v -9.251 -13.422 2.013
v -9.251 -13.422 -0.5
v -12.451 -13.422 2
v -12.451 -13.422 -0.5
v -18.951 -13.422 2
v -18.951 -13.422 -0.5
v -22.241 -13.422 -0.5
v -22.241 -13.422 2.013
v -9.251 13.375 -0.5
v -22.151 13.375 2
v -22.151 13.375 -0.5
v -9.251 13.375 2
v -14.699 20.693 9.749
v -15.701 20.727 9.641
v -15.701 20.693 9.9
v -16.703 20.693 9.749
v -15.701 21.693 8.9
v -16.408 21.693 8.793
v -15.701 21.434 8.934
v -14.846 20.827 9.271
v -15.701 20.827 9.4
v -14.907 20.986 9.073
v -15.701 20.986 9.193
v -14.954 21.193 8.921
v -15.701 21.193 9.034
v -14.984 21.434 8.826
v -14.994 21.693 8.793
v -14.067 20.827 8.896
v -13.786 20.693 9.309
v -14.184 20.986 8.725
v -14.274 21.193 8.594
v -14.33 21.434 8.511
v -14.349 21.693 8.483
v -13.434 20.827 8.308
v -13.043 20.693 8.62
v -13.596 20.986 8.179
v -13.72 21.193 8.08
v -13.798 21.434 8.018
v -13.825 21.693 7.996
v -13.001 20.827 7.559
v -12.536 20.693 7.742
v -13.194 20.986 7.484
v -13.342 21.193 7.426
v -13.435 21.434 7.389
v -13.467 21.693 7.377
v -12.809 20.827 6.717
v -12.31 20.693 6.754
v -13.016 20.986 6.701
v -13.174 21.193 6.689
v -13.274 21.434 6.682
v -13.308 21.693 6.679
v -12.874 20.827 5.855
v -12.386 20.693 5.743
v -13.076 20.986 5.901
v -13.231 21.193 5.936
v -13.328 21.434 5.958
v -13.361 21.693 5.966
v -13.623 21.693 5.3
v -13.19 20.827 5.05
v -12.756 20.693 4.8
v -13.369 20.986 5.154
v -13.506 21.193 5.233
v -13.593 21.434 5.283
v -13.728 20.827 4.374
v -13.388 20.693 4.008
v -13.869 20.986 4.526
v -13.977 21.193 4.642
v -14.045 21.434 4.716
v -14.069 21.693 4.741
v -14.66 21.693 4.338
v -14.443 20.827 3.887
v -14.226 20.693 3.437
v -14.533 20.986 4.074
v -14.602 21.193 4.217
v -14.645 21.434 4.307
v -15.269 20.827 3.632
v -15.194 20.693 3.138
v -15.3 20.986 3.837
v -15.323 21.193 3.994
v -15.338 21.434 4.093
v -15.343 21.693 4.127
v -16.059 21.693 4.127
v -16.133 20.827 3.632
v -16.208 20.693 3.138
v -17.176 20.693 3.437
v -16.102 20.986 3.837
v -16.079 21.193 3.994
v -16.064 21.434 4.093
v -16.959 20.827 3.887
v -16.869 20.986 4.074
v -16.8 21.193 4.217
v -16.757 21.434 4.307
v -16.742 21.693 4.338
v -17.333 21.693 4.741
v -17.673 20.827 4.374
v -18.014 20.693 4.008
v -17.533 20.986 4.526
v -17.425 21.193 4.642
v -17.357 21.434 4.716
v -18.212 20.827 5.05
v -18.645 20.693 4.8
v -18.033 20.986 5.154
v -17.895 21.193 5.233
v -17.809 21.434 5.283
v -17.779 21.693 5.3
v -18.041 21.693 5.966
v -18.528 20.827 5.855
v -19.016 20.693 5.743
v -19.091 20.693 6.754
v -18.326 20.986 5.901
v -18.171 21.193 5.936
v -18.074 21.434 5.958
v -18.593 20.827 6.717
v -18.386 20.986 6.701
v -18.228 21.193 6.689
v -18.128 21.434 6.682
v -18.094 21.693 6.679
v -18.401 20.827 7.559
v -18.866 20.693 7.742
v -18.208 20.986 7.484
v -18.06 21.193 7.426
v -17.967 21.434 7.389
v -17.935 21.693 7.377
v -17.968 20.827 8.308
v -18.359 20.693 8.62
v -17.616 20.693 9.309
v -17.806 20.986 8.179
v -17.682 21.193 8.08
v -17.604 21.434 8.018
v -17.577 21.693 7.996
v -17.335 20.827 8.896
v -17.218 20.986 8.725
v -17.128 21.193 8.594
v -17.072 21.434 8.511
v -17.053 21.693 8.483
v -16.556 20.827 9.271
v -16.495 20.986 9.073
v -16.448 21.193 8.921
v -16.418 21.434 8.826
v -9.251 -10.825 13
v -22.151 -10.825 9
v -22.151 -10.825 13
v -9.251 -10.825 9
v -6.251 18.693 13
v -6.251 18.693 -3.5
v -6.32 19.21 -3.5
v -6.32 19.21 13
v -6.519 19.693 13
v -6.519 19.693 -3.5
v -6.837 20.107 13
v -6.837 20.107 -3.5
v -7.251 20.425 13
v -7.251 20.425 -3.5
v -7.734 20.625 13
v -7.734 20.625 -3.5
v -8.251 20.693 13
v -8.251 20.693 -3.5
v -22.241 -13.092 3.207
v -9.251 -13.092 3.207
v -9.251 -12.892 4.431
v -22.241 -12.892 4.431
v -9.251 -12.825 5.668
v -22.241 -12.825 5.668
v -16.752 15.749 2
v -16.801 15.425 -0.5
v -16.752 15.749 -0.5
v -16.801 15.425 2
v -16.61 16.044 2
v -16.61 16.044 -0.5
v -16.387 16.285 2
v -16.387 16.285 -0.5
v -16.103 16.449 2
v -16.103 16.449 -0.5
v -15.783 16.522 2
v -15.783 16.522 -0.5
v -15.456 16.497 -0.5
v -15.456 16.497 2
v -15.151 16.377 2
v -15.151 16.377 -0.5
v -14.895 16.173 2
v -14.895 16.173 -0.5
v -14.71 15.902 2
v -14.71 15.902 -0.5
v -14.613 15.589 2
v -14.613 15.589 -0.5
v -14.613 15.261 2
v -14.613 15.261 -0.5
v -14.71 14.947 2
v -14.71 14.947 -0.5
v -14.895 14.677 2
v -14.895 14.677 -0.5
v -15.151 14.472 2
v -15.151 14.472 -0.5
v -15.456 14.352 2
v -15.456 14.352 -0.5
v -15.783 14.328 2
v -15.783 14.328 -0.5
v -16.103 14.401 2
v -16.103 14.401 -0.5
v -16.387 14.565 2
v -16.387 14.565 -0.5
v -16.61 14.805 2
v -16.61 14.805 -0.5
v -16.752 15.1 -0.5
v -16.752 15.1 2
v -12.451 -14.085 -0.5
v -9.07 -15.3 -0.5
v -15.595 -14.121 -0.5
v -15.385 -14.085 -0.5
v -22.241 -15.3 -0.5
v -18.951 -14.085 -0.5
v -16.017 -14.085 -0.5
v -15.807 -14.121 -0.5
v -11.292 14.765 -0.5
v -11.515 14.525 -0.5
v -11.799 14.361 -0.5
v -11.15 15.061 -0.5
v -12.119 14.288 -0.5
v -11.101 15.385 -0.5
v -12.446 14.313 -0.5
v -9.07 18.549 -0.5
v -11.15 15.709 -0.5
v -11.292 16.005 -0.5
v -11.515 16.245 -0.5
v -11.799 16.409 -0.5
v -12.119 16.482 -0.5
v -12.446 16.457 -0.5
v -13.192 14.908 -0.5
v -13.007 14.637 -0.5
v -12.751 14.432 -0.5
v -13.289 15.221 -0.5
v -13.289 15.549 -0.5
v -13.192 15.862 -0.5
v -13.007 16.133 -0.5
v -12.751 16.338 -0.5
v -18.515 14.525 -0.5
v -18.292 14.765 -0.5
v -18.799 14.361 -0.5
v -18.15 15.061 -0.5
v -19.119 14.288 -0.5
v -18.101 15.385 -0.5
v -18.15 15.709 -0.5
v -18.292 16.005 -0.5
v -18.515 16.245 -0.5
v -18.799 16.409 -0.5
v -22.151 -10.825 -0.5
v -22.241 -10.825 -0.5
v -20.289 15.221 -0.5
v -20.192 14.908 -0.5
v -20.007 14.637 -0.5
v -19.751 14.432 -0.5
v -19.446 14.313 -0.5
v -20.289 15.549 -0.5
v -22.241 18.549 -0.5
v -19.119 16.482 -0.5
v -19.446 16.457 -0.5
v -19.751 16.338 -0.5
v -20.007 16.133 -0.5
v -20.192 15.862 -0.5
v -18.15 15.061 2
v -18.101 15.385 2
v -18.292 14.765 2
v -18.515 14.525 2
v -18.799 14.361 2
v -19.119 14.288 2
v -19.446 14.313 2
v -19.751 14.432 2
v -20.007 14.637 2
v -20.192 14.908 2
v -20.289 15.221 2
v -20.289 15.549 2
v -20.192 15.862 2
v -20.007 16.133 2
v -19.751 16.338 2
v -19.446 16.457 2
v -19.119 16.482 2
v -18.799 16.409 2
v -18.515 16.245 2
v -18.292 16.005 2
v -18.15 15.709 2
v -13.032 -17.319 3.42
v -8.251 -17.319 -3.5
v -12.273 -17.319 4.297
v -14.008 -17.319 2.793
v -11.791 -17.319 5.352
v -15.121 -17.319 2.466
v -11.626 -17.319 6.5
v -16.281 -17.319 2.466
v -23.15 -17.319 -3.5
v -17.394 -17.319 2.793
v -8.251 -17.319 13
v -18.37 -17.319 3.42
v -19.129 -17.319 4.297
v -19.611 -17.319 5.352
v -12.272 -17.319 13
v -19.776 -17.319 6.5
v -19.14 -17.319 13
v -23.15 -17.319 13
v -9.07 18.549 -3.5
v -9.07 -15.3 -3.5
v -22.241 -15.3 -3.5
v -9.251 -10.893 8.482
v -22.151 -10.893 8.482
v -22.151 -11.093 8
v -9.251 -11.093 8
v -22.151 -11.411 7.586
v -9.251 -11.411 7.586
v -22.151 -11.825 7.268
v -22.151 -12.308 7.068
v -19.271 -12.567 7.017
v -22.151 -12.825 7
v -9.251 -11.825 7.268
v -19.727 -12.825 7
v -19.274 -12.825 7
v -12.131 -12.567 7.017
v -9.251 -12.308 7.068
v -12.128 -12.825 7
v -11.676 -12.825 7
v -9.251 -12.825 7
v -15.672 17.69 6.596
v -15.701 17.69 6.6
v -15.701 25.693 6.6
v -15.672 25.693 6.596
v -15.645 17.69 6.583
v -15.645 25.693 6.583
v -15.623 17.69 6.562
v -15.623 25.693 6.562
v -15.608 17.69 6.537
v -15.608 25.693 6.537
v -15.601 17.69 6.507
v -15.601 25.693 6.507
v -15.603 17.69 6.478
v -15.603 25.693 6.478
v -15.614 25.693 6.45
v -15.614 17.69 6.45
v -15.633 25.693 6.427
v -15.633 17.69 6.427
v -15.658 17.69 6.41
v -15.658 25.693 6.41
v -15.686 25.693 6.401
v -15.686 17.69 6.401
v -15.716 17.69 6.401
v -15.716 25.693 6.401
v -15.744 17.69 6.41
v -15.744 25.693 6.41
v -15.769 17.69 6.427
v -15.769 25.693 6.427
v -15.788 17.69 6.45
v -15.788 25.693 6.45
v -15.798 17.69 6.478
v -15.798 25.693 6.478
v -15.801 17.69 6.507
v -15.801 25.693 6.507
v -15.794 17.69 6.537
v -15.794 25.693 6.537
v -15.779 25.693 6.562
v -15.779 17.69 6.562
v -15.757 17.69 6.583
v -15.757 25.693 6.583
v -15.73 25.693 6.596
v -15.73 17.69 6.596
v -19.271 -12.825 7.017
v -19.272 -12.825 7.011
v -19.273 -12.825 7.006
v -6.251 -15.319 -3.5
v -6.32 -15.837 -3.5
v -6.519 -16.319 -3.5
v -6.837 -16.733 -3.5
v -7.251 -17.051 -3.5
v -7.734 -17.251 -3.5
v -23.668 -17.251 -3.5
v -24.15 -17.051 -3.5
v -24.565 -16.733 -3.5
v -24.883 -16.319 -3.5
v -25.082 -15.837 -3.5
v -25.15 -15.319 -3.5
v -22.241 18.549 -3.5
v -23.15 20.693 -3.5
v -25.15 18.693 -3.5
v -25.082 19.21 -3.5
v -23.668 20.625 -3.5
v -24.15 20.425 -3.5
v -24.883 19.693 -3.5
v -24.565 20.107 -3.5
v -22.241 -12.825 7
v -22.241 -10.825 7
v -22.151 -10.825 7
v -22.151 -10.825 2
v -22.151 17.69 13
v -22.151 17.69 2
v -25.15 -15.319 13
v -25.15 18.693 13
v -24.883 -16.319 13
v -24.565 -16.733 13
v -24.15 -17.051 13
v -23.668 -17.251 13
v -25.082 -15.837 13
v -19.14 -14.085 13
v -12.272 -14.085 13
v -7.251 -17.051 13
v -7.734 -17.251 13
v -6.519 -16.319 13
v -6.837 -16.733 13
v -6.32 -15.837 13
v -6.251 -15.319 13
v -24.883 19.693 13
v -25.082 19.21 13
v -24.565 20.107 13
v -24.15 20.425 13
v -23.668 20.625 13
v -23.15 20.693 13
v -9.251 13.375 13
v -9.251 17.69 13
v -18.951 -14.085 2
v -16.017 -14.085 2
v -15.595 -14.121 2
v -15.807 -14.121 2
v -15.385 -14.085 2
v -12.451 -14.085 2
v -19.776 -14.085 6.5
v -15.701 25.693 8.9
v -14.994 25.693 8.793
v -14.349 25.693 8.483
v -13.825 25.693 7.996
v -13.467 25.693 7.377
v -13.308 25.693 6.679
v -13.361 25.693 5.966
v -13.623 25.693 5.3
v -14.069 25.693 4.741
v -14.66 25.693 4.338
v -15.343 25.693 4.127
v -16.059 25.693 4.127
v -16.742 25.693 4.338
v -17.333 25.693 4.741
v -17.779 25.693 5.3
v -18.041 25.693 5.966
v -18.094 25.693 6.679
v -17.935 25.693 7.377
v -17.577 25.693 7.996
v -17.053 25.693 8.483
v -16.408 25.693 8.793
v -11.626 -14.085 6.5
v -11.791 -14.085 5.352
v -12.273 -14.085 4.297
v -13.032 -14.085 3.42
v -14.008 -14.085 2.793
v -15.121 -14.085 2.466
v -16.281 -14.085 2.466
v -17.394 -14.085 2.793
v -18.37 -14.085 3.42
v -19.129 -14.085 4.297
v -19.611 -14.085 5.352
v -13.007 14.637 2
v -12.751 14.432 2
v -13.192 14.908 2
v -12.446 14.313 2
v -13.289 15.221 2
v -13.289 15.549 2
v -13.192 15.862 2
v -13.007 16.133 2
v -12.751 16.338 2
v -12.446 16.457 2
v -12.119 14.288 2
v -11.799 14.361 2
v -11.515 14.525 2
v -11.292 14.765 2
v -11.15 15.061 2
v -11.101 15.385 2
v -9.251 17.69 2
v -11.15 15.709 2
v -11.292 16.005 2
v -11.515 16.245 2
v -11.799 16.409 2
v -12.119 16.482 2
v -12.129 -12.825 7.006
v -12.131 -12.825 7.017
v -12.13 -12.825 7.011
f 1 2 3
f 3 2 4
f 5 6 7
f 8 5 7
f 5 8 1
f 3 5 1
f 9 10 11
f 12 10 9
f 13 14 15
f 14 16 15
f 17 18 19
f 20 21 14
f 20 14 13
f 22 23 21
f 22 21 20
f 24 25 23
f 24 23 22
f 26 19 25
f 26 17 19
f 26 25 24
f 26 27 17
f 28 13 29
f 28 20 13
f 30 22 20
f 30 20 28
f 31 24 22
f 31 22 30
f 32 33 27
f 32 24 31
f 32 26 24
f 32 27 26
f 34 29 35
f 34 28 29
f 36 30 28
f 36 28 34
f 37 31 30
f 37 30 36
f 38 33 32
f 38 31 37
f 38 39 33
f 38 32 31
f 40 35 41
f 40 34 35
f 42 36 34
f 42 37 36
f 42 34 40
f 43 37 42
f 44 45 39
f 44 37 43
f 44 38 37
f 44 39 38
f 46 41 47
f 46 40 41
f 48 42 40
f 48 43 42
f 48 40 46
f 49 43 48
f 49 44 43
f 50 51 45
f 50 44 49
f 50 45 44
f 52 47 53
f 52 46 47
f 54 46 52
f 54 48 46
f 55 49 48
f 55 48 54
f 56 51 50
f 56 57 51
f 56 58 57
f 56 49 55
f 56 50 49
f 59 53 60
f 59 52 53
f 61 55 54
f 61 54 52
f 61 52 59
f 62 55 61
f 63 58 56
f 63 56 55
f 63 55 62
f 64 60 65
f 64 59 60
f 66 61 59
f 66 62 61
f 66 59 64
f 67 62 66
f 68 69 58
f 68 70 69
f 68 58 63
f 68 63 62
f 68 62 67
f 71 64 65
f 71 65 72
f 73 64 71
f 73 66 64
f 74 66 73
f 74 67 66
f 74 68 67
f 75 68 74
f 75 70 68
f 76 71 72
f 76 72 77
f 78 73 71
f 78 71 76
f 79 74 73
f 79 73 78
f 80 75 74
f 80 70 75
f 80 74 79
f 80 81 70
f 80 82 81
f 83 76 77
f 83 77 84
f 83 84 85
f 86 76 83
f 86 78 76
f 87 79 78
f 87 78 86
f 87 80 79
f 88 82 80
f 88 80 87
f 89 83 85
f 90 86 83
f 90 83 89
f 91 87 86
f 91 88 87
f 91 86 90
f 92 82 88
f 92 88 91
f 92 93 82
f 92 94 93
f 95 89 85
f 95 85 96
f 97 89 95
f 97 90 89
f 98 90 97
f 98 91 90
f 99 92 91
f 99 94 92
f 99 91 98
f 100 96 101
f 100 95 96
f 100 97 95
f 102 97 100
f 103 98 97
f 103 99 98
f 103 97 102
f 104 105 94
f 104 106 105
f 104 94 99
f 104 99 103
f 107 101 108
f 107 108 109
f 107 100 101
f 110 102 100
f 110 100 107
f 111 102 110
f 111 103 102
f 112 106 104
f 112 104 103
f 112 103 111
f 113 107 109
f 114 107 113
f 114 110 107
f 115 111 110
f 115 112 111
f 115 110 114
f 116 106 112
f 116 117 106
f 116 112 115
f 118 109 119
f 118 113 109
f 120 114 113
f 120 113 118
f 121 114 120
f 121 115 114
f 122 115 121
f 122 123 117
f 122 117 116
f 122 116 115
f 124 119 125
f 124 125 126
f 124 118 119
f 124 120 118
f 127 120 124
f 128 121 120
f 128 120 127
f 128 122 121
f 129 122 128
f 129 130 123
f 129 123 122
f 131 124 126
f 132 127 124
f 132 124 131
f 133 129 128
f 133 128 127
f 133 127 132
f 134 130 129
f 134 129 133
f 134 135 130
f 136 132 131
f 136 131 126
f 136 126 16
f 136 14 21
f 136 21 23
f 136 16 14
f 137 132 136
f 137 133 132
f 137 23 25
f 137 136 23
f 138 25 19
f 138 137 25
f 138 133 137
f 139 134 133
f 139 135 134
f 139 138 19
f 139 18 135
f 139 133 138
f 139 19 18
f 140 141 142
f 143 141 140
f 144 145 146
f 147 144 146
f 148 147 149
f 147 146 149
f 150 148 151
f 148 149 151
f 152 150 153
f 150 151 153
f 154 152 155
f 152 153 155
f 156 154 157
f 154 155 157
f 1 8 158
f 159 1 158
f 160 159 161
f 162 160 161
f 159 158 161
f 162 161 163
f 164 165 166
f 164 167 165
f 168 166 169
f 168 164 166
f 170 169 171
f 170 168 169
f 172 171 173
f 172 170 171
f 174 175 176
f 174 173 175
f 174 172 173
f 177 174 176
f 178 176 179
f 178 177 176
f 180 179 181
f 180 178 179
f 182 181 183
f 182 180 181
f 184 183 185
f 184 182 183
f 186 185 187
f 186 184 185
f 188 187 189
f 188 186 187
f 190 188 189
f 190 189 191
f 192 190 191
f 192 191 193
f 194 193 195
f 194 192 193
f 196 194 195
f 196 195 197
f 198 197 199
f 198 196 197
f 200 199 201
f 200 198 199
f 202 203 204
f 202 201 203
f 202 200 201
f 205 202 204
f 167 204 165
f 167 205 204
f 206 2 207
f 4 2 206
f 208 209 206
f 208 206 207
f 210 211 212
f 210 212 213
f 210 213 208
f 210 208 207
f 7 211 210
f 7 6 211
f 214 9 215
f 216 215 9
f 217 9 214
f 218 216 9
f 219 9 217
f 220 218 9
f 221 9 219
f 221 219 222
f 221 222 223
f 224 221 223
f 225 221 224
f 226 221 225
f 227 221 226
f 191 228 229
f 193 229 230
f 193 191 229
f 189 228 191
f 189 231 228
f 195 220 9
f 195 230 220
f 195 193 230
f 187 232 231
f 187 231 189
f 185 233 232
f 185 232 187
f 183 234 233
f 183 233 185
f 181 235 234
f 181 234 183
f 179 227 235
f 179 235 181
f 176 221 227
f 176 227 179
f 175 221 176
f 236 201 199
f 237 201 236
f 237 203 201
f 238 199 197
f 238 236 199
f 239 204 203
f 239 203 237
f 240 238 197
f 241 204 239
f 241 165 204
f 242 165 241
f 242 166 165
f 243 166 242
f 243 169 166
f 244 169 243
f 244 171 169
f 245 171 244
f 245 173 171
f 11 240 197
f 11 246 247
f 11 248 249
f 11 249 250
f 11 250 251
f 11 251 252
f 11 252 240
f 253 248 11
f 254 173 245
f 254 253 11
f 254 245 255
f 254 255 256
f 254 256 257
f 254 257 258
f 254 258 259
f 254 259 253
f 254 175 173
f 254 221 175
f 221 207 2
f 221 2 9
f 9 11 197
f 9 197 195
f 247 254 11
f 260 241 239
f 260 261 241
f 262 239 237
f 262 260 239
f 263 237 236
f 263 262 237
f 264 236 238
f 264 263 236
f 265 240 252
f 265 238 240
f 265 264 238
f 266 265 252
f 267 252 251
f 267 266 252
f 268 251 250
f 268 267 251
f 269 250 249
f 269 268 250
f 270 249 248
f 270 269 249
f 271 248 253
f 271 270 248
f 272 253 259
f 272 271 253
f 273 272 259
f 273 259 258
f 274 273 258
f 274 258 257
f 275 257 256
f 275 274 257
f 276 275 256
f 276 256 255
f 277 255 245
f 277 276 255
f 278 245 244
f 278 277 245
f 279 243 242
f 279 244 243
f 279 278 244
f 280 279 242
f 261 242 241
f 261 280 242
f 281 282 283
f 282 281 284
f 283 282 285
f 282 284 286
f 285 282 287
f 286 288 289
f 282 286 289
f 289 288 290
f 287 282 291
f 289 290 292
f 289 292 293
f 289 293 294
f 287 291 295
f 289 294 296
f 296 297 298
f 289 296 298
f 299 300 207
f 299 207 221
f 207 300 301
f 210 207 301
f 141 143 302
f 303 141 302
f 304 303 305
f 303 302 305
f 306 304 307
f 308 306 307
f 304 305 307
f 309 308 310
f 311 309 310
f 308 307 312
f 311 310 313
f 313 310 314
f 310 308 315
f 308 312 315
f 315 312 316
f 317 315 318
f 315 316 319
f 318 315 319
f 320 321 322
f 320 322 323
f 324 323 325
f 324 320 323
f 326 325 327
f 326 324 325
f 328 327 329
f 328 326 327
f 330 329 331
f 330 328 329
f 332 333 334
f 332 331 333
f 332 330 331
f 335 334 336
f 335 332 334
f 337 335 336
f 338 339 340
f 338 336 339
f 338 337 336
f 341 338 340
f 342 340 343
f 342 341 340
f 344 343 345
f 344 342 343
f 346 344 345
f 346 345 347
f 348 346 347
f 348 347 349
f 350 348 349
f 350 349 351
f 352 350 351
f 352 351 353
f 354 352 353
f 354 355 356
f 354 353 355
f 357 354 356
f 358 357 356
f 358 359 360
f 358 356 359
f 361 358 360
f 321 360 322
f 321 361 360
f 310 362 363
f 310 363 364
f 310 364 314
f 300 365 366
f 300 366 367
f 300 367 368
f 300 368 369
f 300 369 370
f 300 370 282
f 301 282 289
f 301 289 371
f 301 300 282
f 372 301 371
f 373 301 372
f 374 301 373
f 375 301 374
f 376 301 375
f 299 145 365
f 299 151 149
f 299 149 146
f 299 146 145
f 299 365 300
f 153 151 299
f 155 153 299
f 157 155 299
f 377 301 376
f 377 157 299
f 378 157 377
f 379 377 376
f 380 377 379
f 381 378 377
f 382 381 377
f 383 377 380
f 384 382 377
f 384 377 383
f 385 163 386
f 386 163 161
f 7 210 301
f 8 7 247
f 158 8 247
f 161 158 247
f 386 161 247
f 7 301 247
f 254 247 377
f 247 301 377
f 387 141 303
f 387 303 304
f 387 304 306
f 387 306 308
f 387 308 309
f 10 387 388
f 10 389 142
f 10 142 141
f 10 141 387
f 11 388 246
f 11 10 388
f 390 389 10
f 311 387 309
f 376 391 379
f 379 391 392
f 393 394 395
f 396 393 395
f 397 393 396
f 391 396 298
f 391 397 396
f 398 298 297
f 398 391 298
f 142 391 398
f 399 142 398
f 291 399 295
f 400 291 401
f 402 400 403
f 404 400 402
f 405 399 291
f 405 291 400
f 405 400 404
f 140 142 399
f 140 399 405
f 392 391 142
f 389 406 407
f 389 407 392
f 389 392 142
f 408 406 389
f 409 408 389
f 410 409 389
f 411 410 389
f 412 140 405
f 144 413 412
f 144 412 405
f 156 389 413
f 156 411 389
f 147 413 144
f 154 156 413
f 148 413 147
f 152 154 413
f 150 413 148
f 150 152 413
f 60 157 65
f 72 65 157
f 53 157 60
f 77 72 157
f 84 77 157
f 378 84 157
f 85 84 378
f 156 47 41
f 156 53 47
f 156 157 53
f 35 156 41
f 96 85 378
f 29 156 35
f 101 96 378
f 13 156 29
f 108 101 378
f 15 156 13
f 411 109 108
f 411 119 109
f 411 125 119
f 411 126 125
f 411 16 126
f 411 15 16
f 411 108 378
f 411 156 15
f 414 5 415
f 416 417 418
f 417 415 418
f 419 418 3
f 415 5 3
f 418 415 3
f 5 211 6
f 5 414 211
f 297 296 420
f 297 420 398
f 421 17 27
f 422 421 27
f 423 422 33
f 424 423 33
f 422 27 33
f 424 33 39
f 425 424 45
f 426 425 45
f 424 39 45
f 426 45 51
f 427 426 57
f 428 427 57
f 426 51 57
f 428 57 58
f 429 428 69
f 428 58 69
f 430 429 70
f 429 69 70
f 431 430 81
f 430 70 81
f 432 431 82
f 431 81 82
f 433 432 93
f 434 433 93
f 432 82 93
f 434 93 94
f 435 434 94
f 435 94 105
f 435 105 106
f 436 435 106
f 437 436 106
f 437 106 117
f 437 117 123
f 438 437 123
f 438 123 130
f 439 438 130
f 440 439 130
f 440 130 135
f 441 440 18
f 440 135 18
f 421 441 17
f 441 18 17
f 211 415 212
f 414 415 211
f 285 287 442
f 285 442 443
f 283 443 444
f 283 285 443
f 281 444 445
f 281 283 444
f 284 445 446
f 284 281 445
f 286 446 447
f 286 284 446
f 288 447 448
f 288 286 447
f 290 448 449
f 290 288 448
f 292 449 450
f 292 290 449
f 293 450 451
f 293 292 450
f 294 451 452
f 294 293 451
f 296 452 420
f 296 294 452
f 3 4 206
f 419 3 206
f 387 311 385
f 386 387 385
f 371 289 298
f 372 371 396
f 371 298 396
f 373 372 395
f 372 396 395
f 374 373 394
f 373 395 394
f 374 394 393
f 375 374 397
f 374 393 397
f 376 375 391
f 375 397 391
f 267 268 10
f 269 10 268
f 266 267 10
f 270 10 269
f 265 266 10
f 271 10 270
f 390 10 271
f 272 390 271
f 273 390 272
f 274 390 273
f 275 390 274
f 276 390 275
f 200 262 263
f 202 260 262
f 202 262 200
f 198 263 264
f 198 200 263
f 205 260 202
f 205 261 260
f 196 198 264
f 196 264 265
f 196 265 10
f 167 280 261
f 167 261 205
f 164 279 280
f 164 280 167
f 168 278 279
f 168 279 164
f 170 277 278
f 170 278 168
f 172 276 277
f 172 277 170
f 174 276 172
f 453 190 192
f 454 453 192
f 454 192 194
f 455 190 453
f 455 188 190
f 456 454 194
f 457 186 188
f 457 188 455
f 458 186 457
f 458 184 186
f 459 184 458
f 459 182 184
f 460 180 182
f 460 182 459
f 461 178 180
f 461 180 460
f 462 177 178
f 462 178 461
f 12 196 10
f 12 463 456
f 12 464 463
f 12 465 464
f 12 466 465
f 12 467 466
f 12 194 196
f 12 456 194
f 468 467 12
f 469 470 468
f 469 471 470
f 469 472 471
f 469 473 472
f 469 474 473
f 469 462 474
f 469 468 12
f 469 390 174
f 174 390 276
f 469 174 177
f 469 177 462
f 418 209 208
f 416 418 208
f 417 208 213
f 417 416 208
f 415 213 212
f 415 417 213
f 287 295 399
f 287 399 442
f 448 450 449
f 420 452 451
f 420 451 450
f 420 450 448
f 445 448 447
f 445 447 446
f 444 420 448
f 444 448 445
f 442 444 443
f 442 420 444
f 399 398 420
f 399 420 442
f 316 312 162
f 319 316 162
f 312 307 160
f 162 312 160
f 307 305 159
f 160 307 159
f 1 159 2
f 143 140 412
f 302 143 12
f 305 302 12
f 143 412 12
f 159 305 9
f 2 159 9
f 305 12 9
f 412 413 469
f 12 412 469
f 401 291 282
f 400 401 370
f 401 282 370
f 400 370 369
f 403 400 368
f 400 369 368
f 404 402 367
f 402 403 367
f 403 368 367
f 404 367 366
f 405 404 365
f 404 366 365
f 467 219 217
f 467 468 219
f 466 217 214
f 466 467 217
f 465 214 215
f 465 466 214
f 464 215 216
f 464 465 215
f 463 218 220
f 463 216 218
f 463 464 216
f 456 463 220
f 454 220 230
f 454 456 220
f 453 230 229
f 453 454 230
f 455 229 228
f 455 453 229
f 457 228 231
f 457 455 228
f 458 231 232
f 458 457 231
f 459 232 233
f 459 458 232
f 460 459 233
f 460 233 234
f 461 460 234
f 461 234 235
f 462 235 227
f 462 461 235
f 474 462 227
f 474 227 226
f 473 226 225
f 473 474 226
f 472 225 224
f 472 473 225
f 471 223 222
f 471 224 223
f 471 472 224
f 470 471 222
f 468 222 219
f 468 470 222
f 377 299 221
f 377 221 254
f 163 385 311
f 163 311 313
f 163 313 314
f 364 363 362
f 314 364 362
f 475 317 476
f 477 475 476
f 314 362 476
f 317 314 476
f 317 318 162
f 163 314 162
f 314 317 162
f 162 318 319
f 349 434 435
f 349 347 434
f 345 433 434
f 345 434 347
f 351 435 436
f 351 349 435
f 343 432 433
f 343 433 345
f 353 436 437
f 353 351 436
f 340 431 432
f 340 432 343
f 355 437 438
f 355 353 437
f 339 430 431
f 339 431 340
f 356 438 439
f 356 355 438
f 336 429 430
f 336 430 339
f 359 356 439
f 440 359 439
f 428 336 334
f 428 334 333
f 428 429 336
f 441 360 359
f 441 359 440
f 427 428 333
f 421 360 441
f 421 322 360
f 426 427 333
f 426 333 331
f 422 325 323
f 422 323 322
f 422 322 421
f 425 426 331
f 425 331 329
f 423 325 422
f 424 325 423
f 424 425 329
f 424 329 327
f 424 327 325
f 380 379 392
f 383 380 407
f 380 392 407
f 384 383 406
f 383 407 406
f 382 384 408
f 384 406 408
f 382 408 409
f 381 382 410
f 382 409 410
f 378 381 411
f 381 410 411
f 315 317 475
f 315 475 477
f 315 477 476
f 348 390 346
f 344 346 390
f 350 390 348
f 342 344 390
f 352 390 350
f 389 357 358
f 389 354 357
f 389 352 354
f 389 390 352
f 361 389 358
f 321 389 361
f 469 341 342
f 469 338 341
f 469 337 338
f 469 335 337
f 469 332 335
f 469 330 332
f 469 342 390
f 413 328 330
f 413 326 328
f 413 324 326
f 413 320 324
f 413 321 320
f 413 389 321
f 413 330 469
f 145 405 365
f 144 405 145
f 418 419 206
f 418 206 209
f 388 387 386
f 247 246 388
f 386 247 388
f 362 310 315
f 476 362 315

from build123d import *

# Parameters (mm, degrees)
SKETCH_1_W                = 32.6
SKETCH_1_H                = 34.6
SKETCH_1_R                = 1.1
SKETCH_1_R_2              = 1.25
SKETCH_1_W_2              = 24.6
SKETCH_1_H_2              = 24.2
EXTRUDE_1_DEPTH           = 13
SKETCH_3_W                = 6.5
SKETCH_3_H                = 6.519005167
CUT_EXTRUDE_1_DEPTH       = 19
SKETCH_4_W                = 6.5
SKETCH_4_H                = 6.467668889
CUT_EXTRUDE_2_DEPTH       = 23
EXTRUDE_2_DEPTH           = 50
SKETCH_1_2_W              = 22.27659965
SKETCH_1_2_H              = 4.598586669
SKETCH_1_2_W_2            = 22.283050596
SKETCH_1_2_H_2            = 4.977540741
CUT_EXTRUDE_5_DEPTH       = 34
FILLET_1_R                = 2
FILLET_2_R                = 2
SKETCH_9_W                = 54.594998093
SKETCH_9_H                = 18.111982385
SKETCH_9_W_2              = 52.534809486
SKETCH_9_H_2              = 12.989301534
CUT_EXTRUDE_6_DEPTH       = 41
FILLET_6_R                = 22
EXTRUDE_4_DEPTH           = 13
SKETCH_13_W               = 5.518907879
SKETCH_13_H               = 8.361822047
CUT_EXTRUDE_8_DEPTH       = 8.5
SKETCH_14_W               = 6.038657432
SKETCH_14_H               = 7.741248121
CUT_EXTRUDE_9_DEPTH       = 8.5
SKETCH_23_OUTSIDE_W       = 35.102
SKETCH_23_OUTSIDE_H       = 56.702
SKETCH_23_OUTSIDE_W_2     = 1.5
SKETCH_23_OUTSIDE_H_2     = 34.6
CUT_EXTRUDE_10_DEPTH      = 104
SKETCH_24_W               = 10.341780897
SKETCH_24_H               = 5.2
SKETCH_24_R               = 1.25
EXTRUDE_5_DEPTH           = 1.5
SKETCH_25_R               = 1.25
CUT_EXTRUDE_11_DEPTH      = 104
SKETCH_26_OUTSIDE_W       = 115.402
SKETCH_26_OUTSIDE_H       = 56.536
SKETCH_26_OUTSIDE_W_2     = 17.268409177
SKETCH_26_OUTSIDE_H_2     = 34.6
CUT_EXTRUDE_12_DEPTH      = 10
SKETCH_27_W               = 2.368409177
SKETCH_27_H               = 25.781356428
EXTRUDE_6_DEPTH           = 1.5
SKETCH_28_R               = 1.1
CUT_EXTRUDE_13_DEPTH      = 10
CUT_EXTRUDE_START         = -2
CUT_EXTRUDE_14_OUTLINE_W  = 0.368409177
CUT_EXTRUDE_14_OUTLINE_H  = 34.6
CUT_EXTRUDE_14_DEPTH      = 3
SKETCH_30_W               = 15.411127821
SKETCH_30_H               = 34.6
EXTRUDE_7_DEPTH           = 1.5
SKETCH_33_W               = 23.9
SKETCH_33_H               = 38.011921137
SKETCH_33_R               = 1.1
EXTRUDE_8_DEPTH           = 15
SKETCH_34_OUTSIDE_W       = 35.468
SKETCH_34_OUTSIDE_H       = 49.58
SKETCH_34_OUTSIDE_W_2     = 18.899009792
SKETCH_34_OUTSIDE_H_2     = 43.211027868
CUT_EXTRUDE_15_DEPTH      = 13.5
SKETCH_35_W               = 12.9
SKETCH_35_H               = 31.784162084
CUT_EXTRUDE_16_DEPTH      = 11
SKETCH_37_R               = 2.4
EXTRUDE_9_DEPTH           = 5
SKETCH_39_W               = 13.171271292
SKETCH_39_H               = 33.849019387
CUT_EXTRUDE_17_DEPTH      = 3
FILLET_7_R                = 3
CUT_EXTRUDE_18_DEPTH      = 53.759852886
CUT_EXTRUDE_18_DEPTH_BACK = 53.759852886
SKETCH_40_R               = 0.1
SKETCH_42_W               = 13.648654979
SKETCH_42_H               = 4.665334349
EXTRUDE_10_DEPTH          = 11
CUT_EXTRUDE_19_DEPTH      = 4.493948053
SKETCH_43_R               = 3.607554058
CUT_EXTRUDE_20_DEPTH      = 1
SKETCH_44_W               = 12.990377478
SKETCH_44_H               = 2.596310078
CUT_EXTRUDE_21_DEPTH      = 7.5
SKETCH_46_W               = 13.018615597
SKETCH_46_H               = 10.987054625
EXTRUDE_11_DEPTH          = 1.259502583
SKETCH_48_W               = 7.320827495
SKETCH_48_H               = 3.139430645
EXTRUDE_12_DEPTH          = 1
FILLET_9_R                = 11.5
FILLET_11_R               = 2
CUT_EXTRUDE_23_DEPTH      = 41.086666278
CUT_EXTRUDE_23_DEPTH_BACK = 41.086666278
SKETCH_50_W               = 13.704348931
SKETCH_50_H               = 44.342522193
SKETCH_50_W_2             = 6.251475496
FILLET_12_R               = 2
FILLET_13_R               = 1


with BuildPart() as part:
    # Sketch 1 → 凸台-拉伸1 (new body)
    with BuildSketch(Plane.XY):
        with Locations((-9.850980392, 1.274712581)):
            Rectangle(SKETCH_1_W, SKETCH_1_H)
        with Locations(Location((-15.700980392, 15.424712581, 0), (0, 0, 180))):
            Circle(SKETCH_1_R, mode=Mode.SUBTRACT)
        with Locations(Location((-3.600980392, 15.424712581, 0), (0, 0, 180))):
            Circle(SKETCH_1_R_2, mode=Mode.SUBTRACT)
        with Locations(Location((-15.700980392, -12.875287419, 0), (0, 0, 180))):
            Circle(SKETCH_1_R_2, mode=Mode.SUBTRACT)
        with Locations(Location((-3.600980392, -12.875287419, 0), (0, 0, 180))):
            Circle(SKETCH_1_R_2, mode=Mode.SUBTRACT)
        with Locations((-9.850980392, 1.274712581)):
            Rectangle(SKETCH_1_W_2, SKETCH_1_H_2, mode=Mode.SUBTRACT)
    extrude(amount=EXTRUDE_1_DEPTH)

    # 草图3 → 切除-拉伸1 (cut)
    with BuildSketch(Plane(origin=(0, 0, 0), x_dir=(-1, 0, 0), z_dir=(0, 0, -1))):
        with Locations((15.700980392, -10.82528742)):
            Rectangle(SKETCH_3_W, SKETCH_3_H)
    extrude(amount=-CUT_EXTRUDE_1_DEPTH, mode=Mode.SUBTRACT)

    # 草图4 → 切除-拉伸2 (cut)
    with BuildSketch(Plane.XY.offset(13)):
        with Locations((-3.600980392, -10.82528742)):
            Rectangle(SKETCH_4_W, SKETCH_4_H)
    extrude(amount=-CUT_EXTRUDE_2_DEPTH, mode=Mode.SUBTRACT)

    # 草图5 → 凸台-拉伸2 (add)
    with BuildSketch(Plane(origin=(6.449019608, 0, 0), x_dir=(0, 0, -1), z_dir=(1, 0, 0))):
        Polygon((-13, 18.574712581), (-13, 10.055461473), (-13, -16.025287419), (0, -16.025287419), (0, -15.027567927), (0, 16.282461831), (0, 18.574712581), align=None)
    extrude(amount=EXTRUDE_2_DEPTH)

    # Sketch 1 2 → 切除-拉伸5 (cut)
    with BuildSketch(Plane.XY.offset(13)):
        with Locations((24.037173058, -7.263594431)):
            Rectangle(SKETCH_1_2_W, SKETCH_1_2_H)
        with Locations((24.078382453, 0.81654228)):
            Rectangle(SKETCH_1_2_W_2, SKETCH_1_2_H_2)
    extrude(amount=-CUT_EXTRUDE_5_DEPTH, mode=Mode.SUBTRACT)

    # 圆角1
    fillet_1_edges = [part.edges().sort_by_distance(p)[0] for p in [
        (12.936857155, -1.672228091, 6.5),
        (12.936857155, 3.30531265, 6.5),
        (35.219907751, 3.30531265, 6.5),
        (35.219907751, -1.672228091, 6.5),
        (12.898873233, -9.562887765, 6.5),
        (12.898873233, -4.964301096, 6.5),
        (35.175472883, -4.964301096, 6.5),
        (35.175472883, -9.562887765, 6.5),
    ]]
    fillet(fillet_1_edges, radius=FILLET_1_R)

    # 圆角2
    fillet_2_edges = [part.edges().sort_by_distance(p)[0] for p in [
        (-26.150980392, -16.025287419, 6.5),
        (-26.150980392, 18.574712581, 6.5),
    ]]
    fillet(fillet_2_edges, radius=FILLET_2_R)

    # 草图9 → 切除-拉伸6 (cut)
    with BuildSketch(Plane(origin=(0, 0, 0), x_dir=(-1, 0, 0), z_dir=(0, 0, -1))):
        with Locations((-36.934177516, 16.051357777)):
            Rectangle(SKETCH_9_W, SKETCH_9_H)
        with Locations((-36.653242706, -19.247200889)):
            Rectangle(SKETCH_9_W_2, SKETCH_9_H_2)
    extrude(amount=-CUT_EXTRUDE_6_DEPTH, mode=Mode.SUBTRACT)

    # 圆角6
    # the kernel refuses this fillet: 22 mm, written as the material it adds along each edge
    with BuildSketch(Plane(origin=(9.636678469, 6.995366584, 0), x_dir=(0, 1, 0), z_dir=(0, 0, 1))) as fillet_6_piece_1:
        with BuildLine():
            CenterArc((22, -19.375499223), FILLET_6_R, 118.272534833, 61.727465167)
            Line((0, -19.375499223), (-0.44, -19.375499223))
            Line((-0.44, -19.375499223), (-0.44, 0))
            Line((-0.44, 0), (0, 0.44))
            ThreePointArc((0, 0.44), (5.789672998, 0.44), (11.370932916, 0.387509984))
            Line((11.370932916, 0.387509984), (11.579345996, 0))
        make_face()
    extrude(amount=13)
    with BuildSketch(Plane(origin=(10.385837963, -12.752550122, 0), x_dir=(1, 0, 0), z_dir=(0, 0, 1))) as fillet_6_piece_2:
        with BuildLine():
            CenterArc((11.54511289, -22), FILLET_6_R, 90, 31.653290012)
            Line((0, -3.272737297), (-0.230902258, -2.898192043))
            ThreePointArc((-0.230902258, -2.898192043), (-0.44, -1.636368649), (-0.44, 0))
            Line((-0.44, 0), (0, 0.44))
            Line((0, 0.44), (11.54511289, 0.44))
            Line((11.54511289, 0.44), (11.54511289, 0))
        make_face()
    extrude(amount=13)

    # 草图12 → 凸台-拉伸4 (add)
    with BuildSketch(Plane(origin=(0, 0, 0), x_dir=(-1, 0, 0), z_dir=(0, 0, -1))):
        with BuildLine():
            Line((24.150980392, 18.574712581), (24.496655084, -15.99518818))
            ThreePointArc((24.496655084, -15.99518818), (37.015647173, 1.416671567), (24.150980392, 18.574712581))
        make_face()
        with BuildLine():
            Line((26.822698684, 1.289948959), (26.822698684, -8.431688638))
            ThreePointArc((26.822698684, -8.431688638), (32.027920461, 1.289948959), (26.822698684, 11.011586556))
            Line((26.822698684, 11.011586556), (26.822698684, 1.289948959))
        make_face(mode=Mode.SUBTRACT)
    extrude(amount=-EXTRUDE_4_DEPTH)

    # 草图13 → 切除-拉伸8 (cut)
    with BuildSketch(Plane.XY.offset(13)):
        with Locations((-3.600980393, 15.424712581)):
            Rectangle(SKETCH_13_W, SKETCH_13_H)
    extrude(amount=-CUT_EXTRUDE_8_DEPTH, mode=Mode.SUBTRACT)

    # 草图14 → 切除-拉伸9 (cut)
    with BuildSketch(Plane(origin=(0, 0, 0), x_dir=(-1, 0, 0), z_dir=(0, 0, -1))):
        with Locations((15.700980392, 15.424712581)):
            Rectangle(SKETCH_14_W, SKETCH_14_H)
    extrude(amount=-CUT_EXTRUDE_9_DEPTH, mode=Mode.SUBTRACT)

    # 草图23 outside → 切除-拉伸10 (cut)
    with BuildSketch(Plane(origin=(56.449019608, 0, 0), x_dir=(0, 0, -1), z_dir=(1, 0, 0))):
        with Locations((-6.5, 1.275)):
            Rectangle(SKETCH_23_OUTSIDE_W, SKETCH_23_OUTSIDE_H)
        with Locations((-12.25, 1.274712581)):
            Rectangle(SKETCH_23_OUTSIDE_W_2, SKETCH_23_OUTSIDE_H_2, mode=Mode.SUBTRACT)
    extrude(amount=-CUT_EXTRUDE_10_DEPTH, mode=Mode.SUBTRACT)

    # 草图24 → 凸台-拉伸5 (add)
    with BuildSketch(Plane.XY.offset(13)):
        with Locations((-4.17557206, 15.974712581)):
            Rectangle(SKETCH_24_W, SKETCH_24_H)
        with Locations((-3.600980392, 15.429779286)):
            Circle(SKETCH_24_R, mode=Mode.SUBTRACT)
    extrude(amount=-EXTRUDE_5_DEPTH)

    # 草图25 → 切除-拉伸11 (cut)
    with BuildSketch(Plane.XY.offset(13)):
        with Locations((42.624971711, -3.793205976)):
            Circle(SKETCH_25_R)
        with Locations((-34.434765713, 1.289948959)):
            Circle(SKETCH_25_R)
        with Locations((-25.484048207, 14.316394652)):
            Circle(SKETCH_25_R)
        with Locations((-25.484048207, -12.050711449)):
            Circle(SKETCH_25_R)
    extrude(amount=-CUT_EXTRUDE_11_DEPTH, mode=Mode.SUBTRACT)

    # 草图26 outside → 切除-拉伸12 (cut)
    with BuildSketch(Plane.XY.offset(13)):
        with Locations((9.716, 1.275)):
            Rectangle(SKETCH_26_OUTSIDE_W, SKETCH_26_OUTSIDE_H)
        with Locations((-15.516775803, 1.274712581)):
            Rectangle(SKETCH_26_OUTSIDE_W_2, SKETCH_26_OUTSIDE_H_2, mode=Mode.SUBTRACT)
    extrude(amount=-CUT_EXTRUDE_12_DEPTH, mode=Mode.SUBTRACT)

    # 草图27 → 凸台-拉伸6 (add)
    with BuildSketch(Plane.XY.offset(13)):
        with Locations((-8.066775804, 0.484034367)):
            Rectangle(SKETCH_27_W, SKETCH_27_H)
    extrude(amount=-EXTRUDE_6_DEPTH)

    # 草图28 → 切除-拉伸13 (cut)
    with BuildSketch(Plane.XY.offset(13)):
        with Locations((-19.200980392, 15.384992379)):
            Circle(SKETCH_28_R)
        with Locations((-12.200980392, 15.384992379)):
            Circle(SKETCH_28_R)
    extrude(amount=-CUT_EXTRUDE_13_DEPTH, mode=Mode.SUBTRACT)

    # 切除-拉伸14: read off the stored shape, not the designer's step
    # 切除-拉伸14 outline → 切除-拉伸14 (cut)
    with BuildSketch(Plane.XY.offset(13).offset(CUT_EXTRUDE_START)):
        with Locations((-7.066775804, 1.274712581)):
            Rectangle(CUT_EXTRUDE_14_OUTLINE_W, CUT_EXTRUDE_14_OUTLINE_H)
    extrude(amount=CUT_EXTRUDE_14_DEPTH, mode=Mode.SUBTRACT)

    # 草图30 → 凸台-拉伸7 (add)
    with BuildSketch(Plane.XY.offset(13)):
        Polygon((-27.650980392, 18.574712581), (-27.650980392, -16.025287419), (-27.650980392, -17.319235473), (-3.750980392, -17.319235473), (-3.750980392, -16.025287419), (-3.750980392, 18.574712581), (-3.750980392, 20.692685664), (-27.650980392, 20.692685664), align=None)
        with Locations((-15.213421192, 1.274712581)):
            Rectangle(SKETCH_30_W, SKETCH_30_H, mode=Mode.SUBTRACT)
    extrude(amount=-EXTRUDE_7_DEPTH)

    # 草图33 → 凸台-拉伸8 (add)
    with BuildSketch(Plane(origin=(0, 0, 11.5), x_dir=(-1, 0, 0), z_dir=(0, 0, -1))):
        with Locations((15.700980392, 1.686725095)):
            Rectangle(SKETCH_33_W, SKETCH_33_H)
        with Locations((15.700980392, 15.424712581)):
            Circle(SKETCH_33_R, mode=Mode.SUBTRACT)
        with Locations(Location((12.200980392, 15.384992379, 0), (0, 0, 180))):
            Circle(SKETCH_33_R, mode=Mode.SUBTRACT)
        with Locations(Location((19.200980392, 15.384992379, 0), (0, 0, 180))):
            Circle(SKETCH_33_R, mode=Mode.SUBTRACT)
        with BuildLine():
            Line((9.250980392, -10.825287419), (12.450980392, -10.825287419))
            Line((12.450980392, -10.825287419), (12.450980392, -14.084790003))
            Line((12.450980392, -14.084790003), (15.385380168, -14.084790003))
            ThreePointArc((15.385380168, -14.084790003), (15.700980392, -14.125287419), (16.016580616, -14.084790003))
            Line((16.016580616, -14.084790003), (18.950980392, -14.084790003))
            Line((18.950980392, -14.084790003), (18.950980392, -10.825287419))
            Line((18.950980392, -10.825287419), (22.150980392, -10.825287419))
            Line((22.150980392, -10.825287419), (22.150980392, 13.374712581))
            Line((22.150980392, 13.374712581), (9.250980392, 13.374712581))
            Line((9.250980392, 13.374712581), (9.250980392, -10.825287419))
        make_face(mode=Mode.SUBTRACT)
    extrude(amount=EXTRUDE_8_DEPTH)

    # 草图34 outside → 切除-拉伸15 (cut)
    with BuildSketch(Plane.XY.offset(13)):
        with Locations((-15.701, 1.687)):
            Rectangle(SKETCH_34_OUTSIDE_W, SKETCH_34_OUTSIDE_H)
        with Locations((-15.700980392, 2.766642636)):
            Rectangle(SKETCH_34_OUTSIDE_W_2, SKETCH_34_OUTSIDE_H_2, mode=Mode.SUBTRACT)
    extrude(amount=-CUT_EXTRUDE_15_DEPTH, mode=Mode.SUBTRACT)

    # 草图35 → 切除-拉伸16 (cut)
    with BuildSketch(Plane.XY.offset(13)):
        with Locations((-15.700980392, 1.798395824)):
            Rectangle(SKETCH_35_W, SKETCH_35_H)
    extrude(amount=-CUT_EXTRUDE_16_DEPTH, mode=Mode.SUBTRACT)

    # 草图37 → 凸台-拉伸9 (add)
    with BuildSketch(Plane(origin=(0, 20.692685664, 0), x_dir=(1, 0, 0), z_dir=(0, 1, 0))):
        with Locations(Location((-15.700980392, -6.5, 0), (0, 0, 270))):
            Circle(SKETCH_37_R)
    extrude(amount=EXTRUDE_9_DEPTH)

    # 草图39 → 切除-拉伸17 (cut)
    with BuildSketch(Plane(origin=(0, 0, -3.5), x_dir=(-1, 0, 0), z_dir=(0, 0, -1))):
        with Locations((15.655722224, 1.624936556)):
            Rectangle(SKETCH_39_W, SKETCH_39_H)
    extrude(amount=-CUT_EXTRUDE_17_DEPTH, mode=Mode.SUBTRACT)

    # 圆角7
    fillet_7_edges = [part.edges().sort_by_distance(p)[0] for p in [
        (-3.750980392, 20.692685664, -2),
        (-27.650980392, 20.692685664, -2),
        (-27.650980392, -17.319235473, -2),
        (-3.750980392, -17.319235473, -2),
    ]]
    fillet(fillet_7_edges, radius=FILLET_7_R)

    # 草图40 → 切除-拉伸18 (cut, two sides: drawn at the far end of the back side and taken through both)
    with BuildSketch(Plane(origin=(0, 25.692685664, 0), x_dir=(1, 0, 0), z_dir=(0, 1, 0)).offset(-CUT_EXTRUDE_18_DEPTH_BACK)):
        with Locations(Location((-15.700980392, -6.5, 0), (0, 0, 270))):
            Circle(SKETCH_40_R)
    extrude(amount=CUT_EXTRUDE_18_DEPTH + CUT_EXTRUDE_18_DEPTH_BACK, mode=Mode.SUBTRACT)

    # 草图42 → 凸台-拉伸10 (add)
    with BuildSketch(Plane.XY.offset(2)):
        with Locations((-15.66246504, -13.157954594)):
            Rectangle(SKETCH_42_W, SKETCH_42_H)
    extrude(amount=EXTRUDE_10_DEPTH)

    # 草图41 → 切除-拉伸19 (cut)
    with BuildSketch(Plane.XZ.offset(17.319235473)):
        with BuildLine():
            Line((-19.775980392, 6.5), (-18.406082759, 20.501521641))
            ThreePointArc((-18.406082759, 20.501521641), (-15.665794747, 23.749766381), (-13.011106202, 20.431197259))
            Line((-13.011106202, 20.431197259), (-11.625980392, 6.5))
            ThreePointArc((-11.625980392, 6.5), (-15.700980392, 2.425), (-19.775980392, 6.5))
        make_face()
    extrude(amount=-CUT_EXTRUDE_19_DEPTH, mode=Mode.SUBTRACT)

    # 草图43 → 切除-拉伸20 (cut)
    with BuildSketch(Plane.XZ.offset(12.825287419)):
        with Locations(Location((-15.700980392, 6.5, 0), (0, 0, 270))):
            Circle(SKETCH_43_R)
    extrude(amount=-CUT_EXTRUDE_20_DEPTH, mode=Mode.SUBTRACT)

    # 草图44 → 切除-拉伸21 (cut)
    with BuildSketch(Plane(origin=(0, 0, -0.5), x_dir=(-1, 0, 0), z_dir=(0, 0, -1))):
        with Locations((15.746169131, -12.123442458)):
            Rectangle(SKETCH_44_W, SKETCH_44_H)
    extrude(amount=-CUT_EXTRUDE_21_DEPTH, mode=Mode.SUBTRACT)

    # 草图46 → 凸台-拉伸11 (add)
    with BuildSketch(Plane.XZ.offset(12.825287419)):
        with Locations((-15.749811773, 7.506472688)):
            Rectangle(SKETCH_46_W, SKETCH_46_H)
    extrude(amount=EXTRUDE_11_DEPTH)

    # 草图48 → 凸台-拉伸12 (add)
    with BuildSketch(Plane.XZ.offset(11.825287419)):
        with Locations((-15.761363582, 8.5864607)):
            Rectangle(SKETCH_48_W, SKETCH_48_H)
    extrude(amount=EXTRUDE_12_DEPTH)

    # 圆角9
    # the kernel refuses this fillet: 11.5 mm, written as the material it takes off along each edge
    with BuildSketch(Plane(origin=(-22.24135787, -12.825287419, 2.012945375), x_dir=(0, -1.0, 1.3077435417698884e-12), z_dir=(1, 0, 0))) as fillet_9_piece_1:
        with BuildLine():
            CenterArc((11.5, -3.655071281), FILLET_9_R, 161.468118769, 18.531881231)
            Line((0, -3.655071281), (0, 0))
            Line((0, 0), (0.596310077, 0))
        make_face()
    extrude(amount=12.990377478, mode=Mode.SUBTRACT)

    # 圆角11
    # the kernel refuses this fillet: 2 mm, written as the material it takes off along each edge
    with BuildSketch(Plane(origin=(-9.250980392, -10.825287419, 7), x_dir=(0, 0, 1), z_dir=(-1, 0, 0))) as fillet_11_piece_1:
        with BuildLine():
            CenterArc((FILLET_11_R, -FILLET_11_R), FILLET_11_R, 90, 90)
            Line((0, -FILLET_11_R), (0, 0))
            Line((0, 0), (FILLET_11_R, 0))
        make_face()
    extrude(amount=12.9, mode=Mode.SUBTRACT)

    # 草图50 → 切除-拉伸23 (cut, two sides: drawn at the far end of the back side and taken through both)
    with BuildSketch(Plane.XY.offset(-0.5).offset(-CUT_EXTRUDE_23_DEPTH_BACK)):
        with Locations((-32.002659754, -1.520451896)):
            Rectangle(SKETCH_50_W, SKETCH_50_H)
        with Locations((-3.125737748, -1.520451896)):
            Rectangle(SKETCH_50_W_2, SKETCH_50_H)
    extrude(amount=CUT_EXTRUDE_23_DEPTH + CUT_EXTRUDE_23_DEPTH_BACK, mode=Mode.SUBTRACT)

    # 圆角12
    # the kernel refuses this fillet: 2 mm, written as the material it takes off along each edge
    with BuildSketch(Plane(origin=(-25.150485288, -17.27735901, 18.001095904), x_dir=(0.9997808672786077, -0.02093364334354982, 0), z_dir=(0, 0, -1))) as fillet_12_piece_1:
        with BuildLine():
            CenterArc((1.958571075, -1.999561735), FILLET_12_R, 88.800502969, 90)
            Line((-0.04099066, -1.957694448), (-0.240946833, -1.953507719))
            Line((-0.240946833, -1.953507719), (-0.199956173, 0.004186729))
            Line((-0.199956173, 0.004186729), (-0.029164742, 0.197862118))
            ThreePointArc((-0.029164742, 0.197862118), (0.504458794, 0.231367003), (2.00462509, 0.199956173))
            Line((2.00462509, 0.199956173), (2.000438362, 0))
        make_face()
    extrude(amount=26.502191808, mode=Mode.SUBTRACT)
    with BuildSketch(Plane(origin=(-6.251475496, -17.27735901, -8.501095904), x_dir=(0, 1, 0), z_dir=(0, 0, 1))) as fillet_12_piece_2:
        with BuildLine():
            CenterArc((1.958123537, 2), FILLET_12_R, 180, 90)
            Line((-0.041876463, 2), (-0.241876463, 2))
            ThreePointArc((-0.241876463, 2), (-0.241876463, 0.499504896), (-0.197208236, -0.033300326))
            Line((-0.197208236, -0.033300326), (0, -0.2))
            Line((0, -0.2), (1.958123537, -0.2))
            Line((1.958123537, -0.2), (1.958123537, 0))
        make_face()
    extrude(amount=26.502191808, mode=Mode.SUBTRACT)
    with BuildSketch(Plane(origin=(-6.251475496, 20.650809201, -8.501095904), x_dir=(-0.9997808672786077, 0.020933643343547987, -1.13466853616475e-15), z_dir=(0, 0, 1))) as fillet_12_piece_3:
        with BuildLine():
            CenterArc((1.958571075, 1.999561735), FILLET_12_R, 181.199497031, 90)
            Line((-0.04099066, 1.957694448), (-0.240946833, 1.953507719))
            Line((-0.240946833, 1.953507719), (-0.199956173, -0.004186729))
            Line((-0.199956173, -0.004186729), (-0.029164742, -0.197862118))
            ThreePointArc((-0.029164742, -0.197862118), (0.504458794, -0.231367003), (2.00462509, -0.199956173))
            Line((2.00462509, -0.199956173), (2.000438362, 0))
        make_face()
    extrude(amount=26.502191808, mode=Mode.SUBTRACT)
    with BuildSketch(Plane(origin=(-25.150485288, 20.650809201, 18.001095904), x_dir=(0, -1, 0), z_dir=(0, 0, -1))) as fillet_12_piece_4:
        with BuildLine():
            CenterArc((1.958123537, -2), FILLET_12_R, 90, 90)
            Line((-0.041876463, -2), (-0.241876463, -2))
            ThreePointArc((-0.241876463, -2), (-0.241876463, -0.499504896), (-0.197208236, 0.033300326))
            Line((-0.197208236, 0.033300326), (0, 0.2))
            Line((0, 0.2), (1.958123537, 0.2))
            Line((1.958123537, 0.2), (1.958123537, 0))
        make_face()
    extrude(amount=26.502191808, mode=Mode.SUBTRACT)

    # 圆角13
    fillet_13_edges = [part.edges().sort_by_distance(p)[0] for p in [
        (-15.700980392, 20.692685664, 4.1),
    ]]
    fillet(fillet_13_edges, radius=FILLET_13_R)


solid = part.part
